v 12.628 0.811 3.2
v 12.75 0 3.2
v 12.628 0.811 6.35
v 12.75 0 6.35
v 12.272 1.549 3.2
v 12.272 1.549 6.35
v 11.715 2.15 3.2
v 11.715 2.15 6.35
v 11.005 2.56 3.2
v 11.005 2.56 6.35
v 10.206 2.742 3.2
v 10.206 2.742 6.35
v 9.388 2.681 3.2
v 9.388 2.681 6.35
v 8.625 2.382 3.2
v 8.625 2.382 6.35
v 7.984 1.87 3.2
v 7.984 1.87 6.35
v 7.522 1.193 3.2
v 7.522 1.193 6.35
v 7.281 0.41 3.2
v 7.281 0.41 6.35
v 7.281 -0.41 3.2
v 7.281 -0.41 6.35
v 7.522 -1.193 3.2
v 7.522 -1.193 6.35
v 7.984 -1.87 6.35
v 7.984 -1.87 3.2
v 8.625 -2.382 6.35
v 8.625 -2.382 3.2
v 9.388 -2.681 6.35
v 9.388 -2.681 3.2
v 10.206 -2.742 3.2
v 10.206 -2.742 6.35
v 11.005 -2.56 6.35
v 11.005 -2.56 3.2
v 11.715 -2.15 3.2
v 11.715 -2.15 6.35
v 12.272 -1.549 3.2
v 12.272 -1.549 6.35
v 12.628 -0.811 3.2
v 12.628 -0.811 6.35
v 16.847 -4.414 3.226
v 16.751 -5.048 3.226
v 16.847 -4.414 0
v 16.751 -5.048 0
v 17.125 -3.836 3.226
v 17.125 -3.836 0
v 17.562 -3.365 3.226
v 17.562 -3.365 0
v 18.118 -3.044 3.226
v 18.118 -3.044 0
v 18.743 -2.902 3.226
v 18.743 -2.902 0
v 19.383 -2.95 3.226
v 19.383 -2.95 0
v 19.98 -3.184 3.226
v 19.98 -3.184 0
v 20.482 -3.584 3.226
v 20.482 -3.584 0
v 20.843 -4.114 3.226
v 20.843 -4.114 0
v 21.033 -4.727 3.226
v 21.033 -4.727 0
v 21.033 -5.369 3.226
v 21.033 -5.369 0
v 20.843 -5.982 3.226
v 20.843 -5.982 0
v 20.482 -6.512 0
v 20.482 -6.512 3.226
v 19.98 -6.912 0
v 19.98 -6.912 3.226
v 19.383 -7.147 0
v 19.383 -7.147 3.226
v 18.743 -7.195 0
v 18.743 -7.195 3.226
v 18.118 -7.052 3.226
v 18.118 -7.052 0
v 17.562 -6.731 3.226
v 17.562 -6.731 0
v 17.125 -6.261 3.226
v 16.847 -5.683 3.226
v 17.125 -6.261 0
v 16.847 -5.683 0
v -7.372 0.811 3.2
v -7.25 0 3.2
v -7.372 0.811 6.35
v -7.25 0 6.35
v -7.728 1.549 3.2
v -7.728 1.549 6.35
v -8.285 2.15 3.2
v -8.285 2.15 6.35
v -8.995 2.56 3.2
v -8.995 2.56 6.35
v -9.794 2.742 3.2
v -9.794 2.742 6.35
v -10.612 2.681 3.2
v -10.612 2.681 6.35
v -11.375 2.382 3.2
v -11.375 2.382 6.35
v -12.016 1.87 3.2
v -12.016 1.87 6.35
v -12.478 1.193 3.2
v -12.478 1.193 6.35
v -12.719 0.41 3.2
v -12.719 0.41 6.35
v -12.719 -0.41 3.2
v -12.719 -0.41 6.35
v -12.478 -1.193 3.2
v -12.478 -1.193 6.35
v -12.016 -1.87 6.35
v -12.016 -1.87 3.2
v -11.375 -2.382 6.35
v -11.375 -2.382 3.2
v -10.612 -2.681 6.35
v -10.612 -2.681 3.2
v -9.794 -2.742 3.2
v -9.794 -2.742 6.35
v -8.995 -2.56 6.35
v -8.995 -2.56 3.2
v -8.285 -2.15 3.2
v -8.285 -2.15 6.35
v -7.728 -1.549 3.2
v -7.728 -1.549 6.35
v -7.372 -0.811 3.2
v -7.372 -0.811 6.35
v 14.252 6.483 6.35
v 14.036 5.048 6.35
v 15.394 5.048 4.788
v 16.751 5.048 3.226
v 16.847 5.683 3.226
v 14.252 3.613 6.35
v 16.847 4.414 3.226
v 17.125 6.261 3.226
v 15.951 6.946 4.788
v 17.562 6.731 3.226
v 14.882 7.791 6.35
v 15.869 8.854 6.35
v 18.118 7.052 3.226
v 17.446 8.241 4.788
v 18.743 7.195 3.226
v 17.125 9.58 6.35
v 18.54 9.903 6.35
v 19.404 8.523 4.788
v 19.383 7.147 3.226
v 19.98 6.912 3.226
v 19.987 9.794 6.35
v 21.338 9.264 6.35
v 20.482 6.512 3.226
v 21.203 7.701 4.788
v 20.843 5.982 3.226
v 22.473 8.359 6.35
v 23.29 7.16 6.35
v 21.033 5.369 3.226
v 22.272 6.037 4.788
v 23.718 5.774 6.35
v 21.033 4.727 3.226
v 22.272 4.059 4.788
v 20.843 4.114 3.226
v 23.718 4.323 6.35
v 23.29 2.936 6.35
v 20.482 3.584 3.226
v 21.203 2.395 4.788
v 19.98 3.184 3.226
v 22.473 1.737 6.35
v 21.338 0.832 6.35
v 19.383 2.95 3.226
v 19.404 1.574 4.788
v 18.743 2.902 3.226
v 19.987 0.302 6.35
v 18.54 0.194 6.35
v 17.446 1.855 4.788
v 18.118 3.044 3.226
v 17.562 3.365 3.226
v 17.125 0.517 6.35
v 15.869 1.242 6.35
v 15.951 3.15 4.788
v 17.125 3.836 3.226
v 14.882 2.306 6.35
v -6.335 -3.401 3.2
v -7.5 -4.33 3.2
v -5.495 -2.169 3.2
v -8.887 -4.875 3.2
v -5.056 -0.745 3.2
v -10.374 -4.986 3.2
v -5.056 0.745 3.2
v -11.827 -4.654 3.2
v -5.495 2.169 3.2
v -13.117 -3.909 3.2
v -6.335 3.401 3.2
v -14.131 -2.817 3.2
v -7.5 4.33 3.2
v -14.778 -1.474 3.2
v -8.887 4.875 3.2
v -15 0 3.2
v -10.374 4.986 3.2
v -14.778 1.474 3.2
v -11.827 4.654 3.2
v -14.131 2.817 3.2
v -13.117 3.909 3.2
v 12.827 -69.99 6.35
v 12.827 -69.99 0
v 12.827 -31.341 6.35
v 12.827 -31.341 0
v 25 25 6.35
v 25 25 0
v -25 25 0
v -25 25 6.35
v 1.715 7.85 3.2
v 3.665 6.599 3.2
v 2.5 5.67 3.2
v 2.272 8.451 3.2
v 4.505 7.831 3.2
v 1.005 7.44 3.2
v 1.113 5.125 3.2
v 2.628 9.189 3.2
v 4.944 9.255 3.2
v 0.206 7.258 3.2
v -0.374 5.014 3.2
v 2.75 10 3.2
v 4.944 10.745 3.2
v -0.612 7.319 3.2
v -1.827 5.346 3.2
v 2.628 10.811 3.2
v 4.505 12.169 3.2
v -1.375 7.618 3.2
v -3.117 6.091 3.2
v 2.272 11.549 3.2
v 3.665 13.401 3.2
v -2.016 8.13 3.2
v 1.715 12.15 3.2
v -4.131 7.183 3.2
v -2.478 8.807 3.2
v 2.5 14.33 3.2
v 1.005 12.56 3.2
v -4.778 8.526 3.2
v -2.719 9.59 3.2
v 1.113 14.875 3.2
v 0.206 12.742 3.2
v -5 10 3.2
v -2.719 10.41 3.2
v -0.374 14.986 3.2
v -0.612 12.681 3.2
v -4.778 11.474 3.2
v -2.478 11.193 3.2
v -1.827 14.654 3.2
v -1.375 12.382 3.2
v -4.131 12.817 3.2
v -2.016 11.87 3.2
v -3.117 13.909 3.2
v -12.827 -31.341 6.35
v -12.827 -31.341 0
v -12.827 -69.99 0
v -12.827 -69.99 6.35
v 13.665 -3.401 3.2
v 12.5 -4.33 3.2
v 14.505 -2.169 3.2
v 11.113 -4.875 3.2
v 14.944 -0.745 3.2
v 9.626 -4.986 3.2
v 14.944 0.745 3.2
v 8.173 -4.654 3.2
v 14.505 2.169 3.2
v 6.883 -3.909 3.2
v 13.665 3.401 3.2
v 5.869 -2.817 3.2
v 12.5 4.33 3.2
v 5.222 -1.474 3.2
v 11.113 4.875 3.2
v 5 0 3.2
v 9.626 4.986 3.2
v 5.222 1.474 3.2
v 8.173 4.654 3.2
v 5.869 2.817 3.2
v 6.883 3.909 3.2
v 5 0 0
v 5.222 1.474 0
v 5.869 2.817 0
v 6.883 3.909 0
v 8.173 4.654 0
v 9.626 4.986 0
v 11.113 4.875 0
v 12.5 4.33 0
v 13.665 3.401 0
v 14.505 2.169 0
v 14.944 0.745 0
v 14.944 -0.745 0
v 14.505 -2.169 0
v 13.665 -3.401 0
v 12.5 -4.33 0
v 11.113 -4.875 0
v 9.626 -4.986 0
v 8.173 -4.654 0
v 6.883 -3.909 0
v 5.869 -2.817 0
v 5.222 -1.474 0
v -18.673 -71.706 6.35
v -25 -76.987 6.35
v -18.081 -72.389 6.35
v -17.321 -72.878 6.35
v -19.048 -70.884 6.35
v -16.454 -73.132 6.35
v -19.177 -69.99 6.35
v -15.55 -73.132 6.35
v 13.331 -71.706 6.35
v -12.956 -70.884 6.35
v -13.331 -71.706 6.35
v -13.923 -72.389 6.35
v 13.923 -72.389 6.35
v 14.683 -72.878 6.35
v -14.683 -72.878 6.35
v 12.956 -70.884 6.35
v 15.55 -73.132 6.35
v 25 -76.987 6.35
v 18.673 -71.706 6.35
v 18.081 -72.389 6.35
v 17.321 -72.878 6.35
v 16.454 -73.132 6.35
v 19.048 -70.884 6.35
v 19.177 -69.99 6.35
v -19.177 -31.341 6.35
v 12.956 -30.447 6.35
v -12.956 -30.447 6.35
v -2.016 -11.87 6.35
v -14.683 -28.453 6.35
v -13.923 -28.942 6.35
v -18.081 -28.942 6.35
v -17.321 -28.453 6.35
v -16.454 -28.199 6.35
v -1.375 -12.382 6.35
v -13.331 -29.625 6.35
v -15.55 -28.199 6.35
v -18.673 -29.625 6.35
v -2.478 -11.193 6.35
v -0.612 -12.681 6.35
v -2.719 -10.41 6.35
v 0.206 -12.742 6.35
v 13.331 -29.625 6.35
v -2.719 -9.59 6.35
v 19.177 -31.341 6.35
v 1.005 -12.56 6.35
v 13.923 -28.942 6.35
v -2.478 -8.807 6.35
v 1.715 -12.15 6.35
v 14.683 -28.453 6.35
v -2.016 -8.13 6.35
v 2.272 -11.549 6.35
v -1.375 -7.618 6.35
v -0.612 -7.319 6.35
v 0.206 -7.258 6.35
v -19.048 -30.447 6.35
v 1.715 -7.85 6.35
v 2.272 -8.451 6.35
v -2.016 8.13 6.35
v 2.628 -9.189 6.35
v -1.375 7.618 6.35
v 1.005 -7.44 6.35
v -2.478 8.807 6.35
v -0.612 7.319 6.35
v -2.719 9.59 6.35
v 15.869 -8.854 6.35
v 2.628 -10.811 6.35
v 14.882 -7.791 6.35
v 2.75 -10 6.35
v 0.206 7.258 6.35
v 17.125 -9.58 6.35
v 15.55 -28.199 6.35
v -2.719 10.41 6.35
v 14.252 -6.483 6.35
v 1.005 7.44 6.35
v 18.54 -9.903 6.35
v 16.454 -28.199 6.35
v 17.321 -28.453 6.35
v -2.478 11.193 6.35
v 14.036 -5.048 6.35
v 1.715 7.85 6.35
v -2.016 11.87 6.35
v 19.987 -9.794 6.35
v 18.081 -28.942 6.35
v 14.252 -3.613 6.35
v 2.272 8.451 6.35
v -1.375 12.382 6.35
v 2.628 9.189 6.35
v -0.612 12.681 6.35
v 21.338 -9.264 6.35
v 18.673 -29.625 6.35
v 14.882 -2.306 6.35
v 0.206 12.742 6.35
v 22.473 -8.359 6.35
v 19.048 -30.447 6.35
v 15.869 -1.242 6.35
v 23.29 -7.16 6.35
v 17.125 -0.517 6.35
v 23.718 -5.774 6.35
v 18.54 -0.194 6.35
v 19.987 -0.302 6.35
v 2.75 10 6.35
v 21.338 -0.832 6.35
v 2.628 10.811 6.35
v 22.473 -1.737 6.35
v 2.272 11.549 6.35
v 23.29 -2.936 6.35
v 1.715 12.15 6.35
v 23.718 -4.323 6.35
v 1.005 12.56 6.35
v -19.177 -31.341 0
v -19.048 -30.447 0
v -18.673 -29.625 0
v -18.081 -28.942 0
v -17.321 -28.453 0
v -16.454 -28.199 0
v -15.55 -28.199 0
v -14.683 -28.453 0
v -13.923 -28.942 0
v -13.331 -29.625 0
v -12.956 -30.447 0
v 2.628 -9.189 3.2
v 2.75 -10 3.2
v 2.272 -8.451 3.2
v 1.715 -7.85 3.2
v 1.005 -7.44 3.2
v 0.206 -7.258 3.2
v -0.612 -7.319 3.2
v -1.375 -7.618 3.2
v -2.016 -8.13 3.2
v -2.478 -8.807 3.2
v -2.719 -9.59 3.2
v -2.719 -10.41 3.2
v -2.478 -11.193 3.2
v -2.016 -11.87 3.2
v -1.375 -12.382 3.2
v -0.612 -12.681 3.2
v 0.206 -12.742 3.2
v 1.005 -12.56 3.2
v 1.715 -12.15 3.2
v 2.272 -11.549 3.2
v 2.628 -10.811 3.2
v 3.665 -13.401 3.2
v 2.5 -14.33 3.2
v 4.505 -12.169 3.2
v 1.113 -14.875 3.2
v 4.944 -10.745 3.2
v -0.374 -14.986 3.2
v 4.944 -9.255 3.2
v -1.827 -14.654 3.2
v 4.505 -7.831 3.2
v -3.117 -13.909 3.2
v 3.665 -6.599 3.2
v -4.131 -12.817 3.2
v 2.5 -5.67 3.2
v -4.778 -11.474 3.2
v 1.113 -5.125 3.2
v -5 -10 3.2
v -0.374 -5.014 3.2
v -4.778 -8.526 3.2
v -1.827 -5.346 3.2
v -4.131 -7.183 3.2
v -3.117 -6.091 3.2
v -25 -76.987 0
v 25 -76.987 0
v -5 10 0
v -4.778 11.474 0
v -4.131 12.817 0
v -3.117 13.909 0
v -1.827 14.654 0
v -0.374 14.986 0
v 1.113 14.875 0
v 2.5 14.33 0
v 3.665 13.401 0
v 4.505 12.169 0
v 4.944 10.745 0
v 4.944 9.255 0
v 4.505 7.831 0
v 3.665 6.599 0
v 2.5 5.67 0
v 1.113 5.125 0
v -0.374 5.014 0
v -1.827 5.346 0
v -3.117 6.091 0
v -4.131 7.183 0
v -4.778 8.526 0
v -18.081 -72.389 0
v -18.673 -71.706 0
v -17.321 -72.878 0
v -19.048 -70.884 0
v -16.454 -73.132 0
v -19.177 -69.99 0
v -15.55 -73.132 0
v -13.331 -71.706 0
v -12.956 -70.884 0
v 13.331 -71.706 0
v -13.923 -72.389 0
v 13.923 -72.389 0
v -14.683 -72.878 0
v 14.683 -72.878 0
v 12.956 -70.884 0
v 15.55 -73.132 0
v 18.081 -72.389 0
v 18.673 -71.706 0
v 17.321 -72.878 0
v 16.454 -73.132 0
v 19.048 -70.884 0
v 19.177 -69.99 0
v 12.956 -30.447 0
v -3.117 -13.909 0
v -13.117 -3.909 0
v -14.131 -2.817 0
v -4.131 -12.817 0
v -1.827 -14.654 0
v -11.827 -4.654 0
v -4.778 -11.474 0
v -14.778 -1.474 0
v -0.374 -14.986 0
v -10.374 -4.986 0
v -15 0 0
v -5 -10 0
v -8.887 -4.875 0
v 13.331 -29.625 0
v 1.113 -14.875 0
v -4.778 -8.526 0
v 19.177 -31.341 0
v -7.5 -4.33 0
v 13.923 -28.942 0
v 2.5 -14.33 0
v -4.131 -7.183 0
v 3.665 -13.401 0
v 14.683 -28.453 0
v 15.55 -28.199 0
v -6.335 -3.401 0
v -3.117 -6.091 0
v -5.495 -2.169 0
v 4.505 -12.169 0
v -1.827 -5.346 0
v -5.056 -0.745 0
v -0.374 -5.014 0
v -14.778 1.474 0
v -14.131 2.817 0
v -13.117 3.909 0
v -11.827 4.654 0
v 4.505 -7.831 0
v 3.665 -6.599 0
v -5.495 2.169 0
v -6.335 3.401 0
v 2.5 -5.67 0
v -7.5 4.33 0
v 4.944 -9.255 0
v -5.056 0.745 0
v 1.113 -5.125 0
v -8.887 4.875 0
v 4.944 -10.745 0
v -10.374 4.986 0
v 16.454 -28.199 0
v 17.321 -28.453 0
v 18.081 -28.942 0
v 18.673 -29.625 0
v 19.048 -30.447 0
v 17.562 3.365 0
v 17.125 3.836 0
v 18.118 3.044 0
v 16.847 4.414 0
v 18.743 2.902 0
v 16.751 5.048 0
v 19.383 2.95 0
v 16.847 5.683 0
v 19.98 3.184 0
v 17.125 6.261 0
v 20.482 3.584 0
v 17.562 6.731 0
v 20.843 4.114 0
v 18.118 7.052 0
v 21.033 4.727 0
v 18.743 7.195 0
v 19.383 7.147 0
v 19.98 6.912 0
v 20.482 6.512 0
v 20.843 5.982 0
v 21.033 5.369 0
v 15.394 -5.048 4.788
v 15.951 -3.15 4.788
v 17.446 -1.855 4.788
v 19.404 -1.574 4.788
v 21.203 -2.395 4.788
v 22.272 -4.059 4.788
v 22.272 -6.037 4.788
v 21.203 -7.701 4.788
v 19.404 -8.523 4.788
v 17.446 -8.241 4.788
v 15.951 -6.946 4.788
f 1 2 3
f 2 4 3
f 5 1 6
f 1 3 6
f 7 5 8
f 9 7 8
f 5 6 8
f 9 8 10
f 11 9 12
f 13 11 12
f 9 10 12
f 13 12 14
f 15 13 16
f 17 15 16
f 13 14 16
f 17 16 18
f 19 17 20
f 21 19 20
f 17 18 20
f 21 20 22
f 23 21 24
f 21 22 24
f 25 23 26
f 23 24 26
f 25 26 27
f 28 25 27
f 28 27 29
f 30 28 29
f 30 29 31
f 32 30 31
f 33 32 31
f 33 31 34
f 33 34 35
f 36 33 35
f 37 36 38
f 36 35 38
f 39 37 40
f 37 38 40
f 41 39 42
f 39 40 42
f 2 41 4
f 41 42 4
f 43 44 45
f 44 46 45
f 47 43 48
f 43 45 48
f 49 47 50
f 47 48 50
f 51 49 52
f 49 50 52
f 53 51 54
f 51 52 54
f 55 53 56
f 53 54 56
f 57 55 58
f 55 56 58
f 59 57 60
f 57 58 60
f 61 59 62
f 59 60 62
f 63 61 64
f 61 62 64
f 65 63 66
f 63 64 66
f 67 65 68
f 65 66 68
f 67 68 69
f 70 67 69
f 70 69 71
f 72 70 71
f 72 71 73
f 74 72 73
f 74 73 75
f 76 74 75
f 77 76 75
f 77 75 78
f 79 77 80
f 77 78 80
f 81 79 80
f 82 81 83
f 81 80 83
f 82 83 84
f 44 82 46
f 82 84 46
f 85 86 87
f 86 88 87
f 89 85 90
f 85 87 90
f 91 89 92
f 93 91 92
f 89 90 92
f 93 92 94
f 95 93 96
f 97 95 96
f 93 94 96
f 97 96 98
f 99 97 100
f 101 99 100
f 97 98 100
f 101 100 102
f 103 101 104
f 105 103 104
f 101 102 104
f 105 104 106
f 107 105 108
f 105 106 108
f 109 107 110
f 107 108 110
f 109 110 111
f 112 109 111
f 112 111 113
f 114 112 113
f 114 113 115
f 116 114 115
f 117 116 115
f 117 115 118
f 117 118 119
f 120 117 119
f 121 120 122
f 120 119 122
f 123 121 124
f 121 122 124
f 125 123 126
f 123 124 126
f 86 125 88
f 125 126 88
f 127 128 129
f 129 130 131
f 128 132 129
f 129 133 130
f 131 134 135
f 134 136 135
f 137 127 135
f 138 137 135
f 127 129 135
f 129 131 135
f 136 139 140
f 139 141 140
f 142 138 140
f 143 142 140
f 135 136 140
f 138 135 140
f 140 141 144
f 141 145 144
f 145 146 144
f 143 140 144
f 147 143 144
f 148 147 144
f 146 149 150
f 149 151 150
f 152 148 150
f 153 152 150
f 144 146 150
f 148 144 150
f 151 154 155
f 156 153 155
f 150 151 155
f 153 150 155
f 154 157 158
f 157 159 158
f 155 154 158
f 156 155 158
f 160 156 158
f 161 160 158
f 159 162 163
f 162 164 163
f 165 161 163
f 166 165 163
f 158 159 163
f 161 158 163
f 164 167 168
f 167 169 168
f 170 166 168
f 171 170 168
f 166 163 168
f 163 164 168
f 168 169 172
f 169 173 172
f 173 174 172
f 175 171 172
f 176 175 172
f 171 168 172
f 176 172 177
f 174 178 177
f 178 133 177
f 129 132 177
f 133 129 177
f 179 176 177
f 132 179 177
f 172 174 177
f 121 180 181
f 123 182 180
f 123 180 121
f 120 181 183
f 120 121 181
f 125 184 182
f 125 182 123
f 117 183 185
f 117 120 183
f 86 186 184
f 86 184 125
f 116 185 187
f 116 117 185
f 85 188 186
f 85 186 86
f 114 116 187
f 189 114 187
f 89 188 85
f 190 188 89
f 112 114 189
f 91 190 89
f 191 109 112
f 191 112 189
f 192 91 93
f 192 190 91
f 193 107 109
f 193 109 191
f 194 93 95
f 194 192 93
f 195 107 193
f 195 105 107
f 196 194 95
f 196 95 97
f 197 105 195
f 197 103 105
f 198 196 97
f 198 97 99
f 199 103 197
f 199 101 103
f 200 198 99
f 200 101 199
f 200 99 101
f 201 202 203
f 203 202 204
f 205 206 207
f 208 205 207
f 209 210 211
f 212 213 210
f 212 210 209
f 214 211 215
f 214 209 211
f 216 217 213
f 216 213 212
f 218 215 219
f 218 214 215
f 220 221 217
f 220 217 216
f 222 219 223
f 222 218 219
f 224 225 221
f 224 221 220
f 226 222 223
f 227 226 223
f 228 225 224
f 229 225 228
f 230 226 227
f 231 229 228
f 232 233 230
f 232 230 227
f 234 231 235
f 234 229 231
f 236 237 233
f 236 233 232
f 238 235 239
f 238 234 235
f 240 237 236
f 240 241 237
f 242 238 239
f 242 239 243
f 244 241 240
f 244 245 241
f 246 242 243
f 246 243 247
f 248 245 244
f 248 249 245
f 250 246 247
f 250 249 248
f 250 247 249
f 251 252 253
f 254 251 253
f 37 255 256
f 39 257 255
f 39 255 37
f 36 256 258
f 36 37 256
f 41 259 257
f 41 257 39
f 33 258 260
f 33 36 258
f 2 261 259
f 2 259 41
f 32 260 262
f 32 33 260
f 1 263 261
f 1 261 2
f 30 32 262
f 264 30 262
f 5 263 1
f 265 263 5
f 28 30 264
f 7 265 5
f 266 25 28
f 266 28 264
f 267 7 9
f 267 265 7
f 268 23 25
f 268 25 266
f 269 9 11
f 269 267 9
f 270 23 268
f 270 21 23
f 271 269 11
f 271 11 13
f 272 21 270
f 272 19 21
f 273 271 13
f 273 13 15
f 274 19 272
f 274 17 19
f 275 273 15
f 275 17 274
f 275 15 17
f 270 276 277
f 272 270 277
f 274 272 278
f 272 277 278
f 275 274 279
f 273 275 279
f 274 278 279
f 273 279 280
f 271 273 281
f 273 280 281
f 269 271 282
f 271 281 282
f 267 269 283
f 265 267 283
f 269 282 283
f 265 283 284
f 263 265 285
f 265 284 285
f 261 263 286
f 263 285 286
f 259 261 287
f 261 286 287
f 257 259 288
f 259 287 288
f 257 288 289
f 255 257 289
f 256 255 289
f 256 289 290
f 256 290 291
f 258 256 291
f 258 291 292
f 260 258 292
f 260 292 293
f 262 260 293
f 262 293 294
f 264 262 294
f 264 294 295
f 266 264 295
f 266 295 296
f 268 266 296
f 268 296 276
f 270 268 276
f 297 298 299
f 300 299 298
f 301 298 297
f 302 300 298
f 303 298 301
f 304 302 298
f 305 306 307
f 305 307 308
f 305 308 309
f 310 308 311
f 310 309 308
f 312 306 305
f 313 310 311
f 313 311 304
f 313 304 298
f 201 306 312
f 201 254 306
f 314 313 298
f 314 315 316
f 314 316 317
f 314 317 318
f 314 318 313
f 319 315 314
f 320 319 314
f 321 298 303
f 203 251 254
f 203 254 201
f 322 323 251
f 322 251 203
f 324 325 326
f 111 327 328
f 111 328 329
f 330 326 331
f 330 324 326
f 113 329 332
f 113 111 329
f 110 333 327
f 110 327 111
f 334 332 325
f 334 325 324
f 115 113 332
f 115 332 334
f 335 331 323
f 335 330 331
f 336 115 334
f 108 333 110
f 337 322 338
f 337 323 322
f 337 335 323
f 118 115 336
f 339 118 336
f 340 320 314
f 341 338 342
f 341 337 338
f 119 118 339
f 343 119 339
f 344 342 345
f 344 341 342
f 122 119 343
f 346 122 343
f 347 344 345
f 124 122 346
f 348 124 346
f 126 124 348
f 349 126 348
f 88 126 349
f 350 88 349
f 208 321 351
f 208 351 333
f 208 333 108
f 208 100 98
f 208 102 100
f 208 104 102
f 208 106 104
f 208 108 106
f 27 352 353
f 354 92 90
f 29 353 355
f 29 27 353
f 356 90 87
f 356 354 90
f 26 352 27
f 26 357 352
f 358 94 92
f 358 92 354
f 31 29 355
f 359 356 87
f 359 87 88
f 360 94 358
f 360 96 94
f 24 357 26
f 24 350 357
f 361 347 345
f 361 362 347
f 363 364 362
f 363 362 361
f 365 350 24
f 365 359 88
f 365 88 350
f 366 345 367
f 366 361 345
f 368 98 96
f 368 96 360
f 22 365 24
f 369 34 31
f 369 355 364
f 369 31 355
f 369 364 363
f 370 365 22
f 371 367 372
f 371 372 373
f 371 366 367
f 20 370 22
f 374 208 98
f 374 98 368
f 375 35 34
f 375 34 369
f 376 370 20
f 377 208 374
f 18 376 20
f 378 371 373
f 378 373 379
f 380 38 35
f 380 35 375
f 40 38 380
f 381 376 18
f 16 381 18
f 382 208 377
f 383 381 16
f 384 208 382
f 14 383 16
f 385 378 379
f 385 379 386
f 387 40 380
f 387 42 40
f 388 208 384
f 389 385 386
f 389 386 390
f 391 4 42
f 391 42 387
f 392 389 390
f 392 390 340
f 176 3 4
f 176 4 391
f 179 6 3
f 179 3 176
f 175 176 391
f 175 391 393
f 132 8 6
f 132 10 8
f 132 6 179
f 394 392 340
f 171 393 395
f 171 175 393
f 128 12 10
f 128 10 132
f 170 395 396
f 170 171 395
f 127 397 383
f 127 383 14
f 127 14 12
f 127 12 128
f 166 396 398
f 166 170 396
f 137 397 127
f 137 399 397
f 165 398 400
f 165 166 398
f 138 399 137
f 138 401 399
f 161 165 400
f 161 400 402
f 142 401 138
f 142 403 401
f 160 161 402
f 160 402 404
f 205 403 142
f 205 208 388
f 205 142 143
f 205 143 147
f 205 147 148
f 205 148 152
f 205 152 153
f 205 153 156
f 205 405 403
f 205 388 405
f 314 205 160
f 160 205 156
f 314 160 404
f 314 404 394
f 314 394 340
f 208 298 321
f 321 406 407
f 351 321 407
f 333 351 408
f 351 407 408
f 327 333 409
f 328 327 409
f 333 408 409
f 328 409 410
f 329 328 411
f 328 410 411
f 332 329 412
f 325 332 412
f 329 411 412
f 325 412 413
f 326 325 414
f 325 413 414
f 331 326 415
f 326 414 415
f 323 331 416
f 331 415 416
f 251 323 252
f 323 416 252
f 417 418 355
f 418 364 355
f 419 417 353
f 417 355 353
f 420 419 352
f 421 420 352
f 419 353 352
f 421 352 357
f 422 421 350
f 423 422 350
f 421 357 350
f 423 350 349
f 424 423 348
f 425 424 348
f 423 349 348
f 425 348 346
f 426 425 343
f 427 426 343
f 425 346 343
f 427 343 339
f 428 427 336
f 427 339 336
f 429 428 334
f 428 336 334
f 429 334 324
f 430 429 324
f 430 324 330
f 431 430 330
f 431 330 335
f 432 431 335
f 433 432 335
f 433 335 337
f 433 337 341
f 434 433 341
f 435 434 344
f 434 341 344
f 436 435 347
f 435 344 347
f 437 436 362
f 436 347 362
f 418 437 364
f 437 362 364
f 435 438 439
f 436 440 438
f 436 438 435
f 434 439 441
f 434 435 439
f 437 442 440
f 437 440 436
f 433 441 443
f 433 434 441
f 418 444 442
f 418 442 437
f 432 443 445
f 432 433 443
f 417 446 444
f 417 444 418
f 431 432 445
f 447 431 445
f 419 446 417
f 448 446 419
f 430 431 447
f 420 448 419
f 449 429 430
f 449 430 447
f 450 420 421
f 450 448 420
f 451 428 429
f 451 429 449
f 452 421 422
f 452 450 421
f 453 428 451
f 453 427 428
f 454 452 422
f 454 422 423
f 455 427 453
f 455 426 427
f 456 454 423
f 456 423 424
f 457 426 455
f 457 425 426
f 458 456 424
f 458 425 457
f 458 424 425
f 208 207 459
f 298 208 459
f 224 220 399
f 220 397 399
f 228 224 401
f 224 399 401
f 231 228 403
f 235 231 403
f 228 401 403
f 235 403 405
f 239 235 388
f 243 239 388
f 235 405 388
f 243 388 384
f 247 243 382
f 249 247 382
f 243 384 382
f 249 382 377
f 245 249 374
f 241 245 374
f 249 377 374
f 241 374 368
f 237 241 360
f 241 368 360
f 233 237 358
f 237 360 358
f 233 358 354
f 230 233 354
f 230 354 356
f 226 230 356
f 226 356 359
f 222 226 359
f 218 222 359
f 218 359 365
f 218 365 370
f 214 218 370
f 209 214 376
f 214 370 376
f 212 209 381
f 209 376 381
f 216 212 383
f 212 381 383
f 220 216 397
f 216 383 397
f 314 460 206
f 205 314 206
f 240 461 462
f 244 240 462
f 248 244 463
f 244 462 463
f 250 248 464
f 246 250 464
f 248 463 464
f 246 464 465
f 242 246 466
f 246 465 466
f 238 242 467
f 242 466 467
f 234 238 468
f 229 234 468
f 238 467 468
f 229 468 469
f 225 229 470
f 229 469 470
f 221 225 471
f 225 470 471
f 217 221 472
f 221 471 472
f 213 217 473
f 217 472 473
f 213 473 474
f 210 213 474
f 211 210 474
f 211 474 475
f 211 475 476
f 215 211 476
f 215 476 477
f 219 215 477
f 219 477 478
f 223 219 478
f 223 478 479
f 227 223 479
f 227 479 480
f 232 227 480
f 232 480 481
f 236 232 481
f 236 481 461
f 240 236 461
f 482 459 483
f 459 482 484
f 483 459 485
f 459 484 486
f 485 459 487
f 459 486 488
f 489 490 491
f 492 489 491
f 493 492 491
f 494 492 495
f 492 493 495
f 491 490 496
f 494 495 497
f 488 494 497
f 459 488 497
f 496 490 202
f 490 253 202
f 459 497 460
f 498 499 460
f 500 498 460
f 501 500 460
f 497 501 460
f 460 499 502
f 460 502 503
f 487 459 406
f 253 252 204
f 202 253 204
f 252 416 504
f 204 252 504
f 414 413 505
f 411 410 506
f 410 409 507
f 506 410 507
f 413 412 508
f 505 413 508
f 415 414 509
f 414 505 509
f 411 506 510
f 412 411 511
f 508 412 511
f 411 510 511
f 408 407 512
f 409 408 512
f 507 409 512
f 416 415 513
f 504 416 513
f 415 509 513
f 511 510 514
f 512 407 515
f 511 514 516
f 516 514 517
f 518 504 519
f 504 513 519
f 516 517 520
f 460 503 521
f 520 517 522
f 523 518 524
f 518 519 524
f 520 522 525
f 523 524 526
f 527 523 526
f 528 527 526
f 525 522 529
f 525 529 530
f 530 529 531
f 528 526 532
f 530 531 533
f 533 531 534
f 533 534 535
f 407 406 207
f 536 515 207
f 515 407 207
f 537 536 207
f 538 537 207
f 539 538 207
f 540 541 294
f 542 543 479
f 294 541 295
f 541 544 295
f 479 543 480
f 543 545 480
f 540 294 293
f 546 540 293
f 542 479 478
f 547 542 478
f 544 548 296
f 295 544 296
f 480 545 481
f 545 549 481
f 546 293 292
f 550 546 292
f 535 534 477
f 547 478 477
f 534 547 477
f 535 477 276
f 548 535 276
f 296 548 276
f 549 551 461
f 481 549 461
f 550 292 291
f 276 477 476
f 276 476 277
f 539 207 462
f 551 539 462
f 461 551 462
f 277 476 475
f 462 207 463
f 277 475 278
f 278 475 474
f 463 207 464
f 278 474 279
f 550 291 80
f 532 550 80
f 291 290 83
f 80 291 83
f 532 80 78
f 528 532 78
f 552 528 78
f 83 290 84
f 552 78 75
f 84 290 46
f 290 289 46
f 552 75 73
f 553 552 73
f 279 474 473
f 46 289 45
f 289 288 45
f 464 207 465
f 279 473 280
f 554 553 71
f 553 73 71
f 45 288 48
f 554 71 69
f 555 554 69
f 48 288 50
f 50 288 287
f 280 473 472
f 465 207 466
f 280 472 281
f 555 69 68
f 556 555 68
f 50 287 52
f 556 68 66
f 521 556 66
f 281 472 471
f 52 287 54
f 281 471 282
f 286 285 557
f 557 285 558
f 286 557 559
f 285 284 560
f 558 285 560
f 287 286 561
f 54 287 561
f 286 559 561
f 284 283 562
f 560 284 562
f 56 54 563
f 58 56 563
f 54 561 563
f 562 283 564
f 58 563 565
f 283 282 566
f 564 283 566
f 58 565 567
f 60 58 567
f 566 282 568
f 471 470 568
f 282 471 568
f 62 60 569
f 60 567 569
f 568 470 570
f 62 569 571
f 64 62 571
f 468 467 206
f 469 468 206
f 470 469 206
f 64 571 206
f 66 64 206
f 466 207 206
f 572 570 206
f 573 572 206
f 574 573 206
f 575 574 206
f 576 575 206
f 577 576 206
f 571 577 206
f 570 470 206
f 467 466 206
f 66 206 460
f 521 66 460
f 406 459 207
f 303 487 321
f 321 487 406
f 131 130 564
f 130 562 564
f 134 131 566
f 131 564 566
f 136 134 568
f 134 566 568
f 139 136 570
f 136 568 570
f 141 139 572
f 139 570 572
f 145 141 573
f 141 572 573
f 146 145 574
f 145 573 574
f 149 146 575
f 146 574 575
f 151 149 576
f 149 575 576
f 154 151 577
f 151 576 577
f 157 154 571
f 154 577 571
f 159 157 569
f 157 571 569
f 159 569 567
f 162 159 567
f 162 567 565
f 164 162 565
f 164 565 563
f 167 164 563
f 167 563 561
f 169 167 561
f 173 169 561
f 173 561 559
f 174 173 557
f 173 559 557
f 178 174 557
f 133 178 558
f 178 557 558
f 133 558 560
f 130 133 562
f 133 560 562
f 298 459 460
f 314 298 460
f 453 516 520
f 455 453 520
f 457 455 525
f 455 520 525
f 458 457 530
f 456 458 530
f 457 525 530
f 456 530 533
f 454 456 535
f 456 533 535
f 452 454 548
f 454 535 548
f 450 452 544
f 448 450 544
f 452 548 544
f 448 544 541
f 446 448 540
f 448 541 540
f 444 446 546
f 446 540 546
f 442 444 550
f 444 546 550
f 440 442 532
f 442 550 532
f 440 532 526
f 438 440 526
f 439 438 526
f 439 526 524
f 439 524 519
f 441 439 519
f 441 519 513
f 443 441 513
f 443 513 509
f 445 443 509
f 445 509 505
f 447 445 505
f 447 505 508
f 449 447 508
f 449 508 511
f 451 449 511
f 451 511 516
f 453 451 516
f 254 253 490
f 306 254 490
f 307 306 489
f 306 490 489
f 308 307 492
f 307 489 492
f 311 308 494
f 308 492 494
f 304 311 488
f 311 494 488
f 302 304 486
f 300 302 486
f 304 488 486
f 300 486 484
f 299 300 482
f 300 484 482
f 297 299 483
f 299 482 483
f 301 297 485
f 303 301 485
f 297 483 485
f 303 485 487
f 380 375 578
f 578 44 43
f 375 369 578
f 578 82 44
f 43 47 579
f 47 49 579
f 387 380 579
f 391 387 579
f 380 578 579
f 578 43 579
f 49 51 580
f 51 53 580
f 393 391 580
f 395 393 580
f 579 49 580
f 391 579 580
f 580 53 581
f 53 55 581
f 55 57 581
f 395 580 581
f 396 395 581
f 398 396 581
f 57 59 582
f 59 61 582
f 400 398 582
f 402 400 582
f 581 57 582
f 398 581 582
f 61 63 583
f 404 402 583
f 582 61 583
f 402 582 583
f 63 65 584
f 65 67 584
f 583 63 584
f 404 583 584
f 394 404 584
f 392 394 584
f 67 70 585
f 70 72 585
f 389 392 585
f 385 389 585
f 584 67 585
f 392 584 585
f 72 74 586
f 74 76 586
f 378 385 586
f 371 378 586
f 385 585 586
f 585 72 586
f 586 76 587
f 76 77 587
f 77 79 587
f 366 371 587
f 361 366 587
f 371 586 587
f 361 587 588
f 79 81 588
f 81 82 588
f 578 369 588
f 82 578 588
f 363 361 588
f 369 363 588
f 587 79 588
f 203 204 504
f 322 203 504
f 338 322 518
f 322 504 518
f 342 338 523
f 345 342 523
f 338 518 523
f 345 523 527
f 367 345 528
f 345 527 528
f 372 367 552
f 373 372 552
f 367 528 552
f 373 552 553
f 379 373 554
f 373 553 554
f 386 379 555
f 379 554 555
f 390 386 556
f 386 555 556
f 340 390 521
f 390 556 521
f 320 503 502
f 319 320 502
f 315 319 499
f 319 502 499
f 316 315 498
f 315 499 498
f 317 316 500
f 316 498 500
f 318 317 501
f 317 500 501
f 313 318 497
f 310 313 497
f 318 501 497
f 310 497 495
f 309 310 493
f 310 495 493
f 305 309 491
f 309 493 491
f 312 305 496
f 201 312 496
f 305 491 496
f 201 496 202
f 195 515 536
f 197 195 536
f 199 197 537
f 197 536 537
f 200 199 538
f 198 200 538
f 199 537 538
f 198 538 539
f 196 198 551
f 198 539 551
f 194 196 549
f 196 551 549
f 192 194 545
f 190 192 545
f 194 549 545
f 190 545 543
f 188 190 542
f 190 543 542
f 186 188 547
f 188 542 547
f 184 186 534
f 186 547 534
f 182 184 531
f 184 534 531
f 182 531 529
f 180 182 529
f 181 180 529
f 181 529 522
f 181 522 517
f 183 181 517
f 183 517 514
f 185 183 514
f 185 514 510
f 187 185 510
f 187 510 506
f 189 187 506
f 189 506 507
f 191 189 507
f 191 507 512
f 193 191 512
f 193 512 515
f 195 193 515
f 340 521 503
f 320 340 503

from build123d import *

# Parameters (mm, degrees)
BOSS_EXTRUDE1_DEPTH                            = 6.35
CSK_FOR_6_FLAT_HEAD_MACHINE_SCREW2_D           = 4.3053
CSK_FOR_6_FLAT_HEAD_MACHINE_SCREW2_CSINK_D     = 9.7361756
CSK_FOR_6_FLAT_HEAD_MACHINE_SCREW2_CSINK_ANGLE = 82
CBORE_FOR_M5_SHCS1_D                           = 5.5
CBORE_FOR_M5_SHCS1_CBORE_D                     = 10
CBORE_FOR_M5_SHCS1_CBORE_DEPTH                 = 3.2


with BuildPart() as part:
    # Sketch1 → Boss-Extrude1 (new body)
    with BuildSketch(Plane.XY):
        Polygon((25, -76.9874), (25, 25), (-25, 25), (-25, -76.9874), (0, -76.9874), align=None)
        with BuildLine():
            ThreePointArc((-19.177, -31.341450548), (-16.002, -28.166450548), (-12.827, -31.341450548))
            Line((-12.827, -31.341450548), (-12.827, -69.9897))
            ThreePointArc((-12.827, -69.9897), (-16.002, -73.1647), (-19.177, -69.9897))
            Line((-19.177, -69.9897), (-19.177, -31.341450548))
        make_face(mode=Mode.SUBTRACT)
        with BuildLine():
            ThreePointArc((12.827, -31.341450548), (16.002, -28.166450548), (19.177, -31.341450548))
            Line((19.177, -31.341450548), (19.177, -69.9897))
            ThreePointArc((19.177, -69.9897), (16.002, -73.1647), (12.827, -69.9897))
            Line((12.827, -69.9897), (12.827, -31.341450548))
        make_face(mode=Mode.SUBTRACT)
    extrude(amount=BOSS_EXTRUDE1_DEPTH)

    # CSK for #6 Flat Head Machine Screw2 (through all)
    with Locations(Plane.XY.offset(6.35)):
        with Locations((18.904, 5.04825), (18.904, -5.04825)):
            CounterSinkHole(CSK_FOR_6_FLAT_HEAD_MACHINE_SCREW2_D / 2, CSK_FOR_6_FLAT_HEAD_MACHINE_SCREW2_CSINK_D / 2, counter_sink_angle=CSK_FOR_6_FLAT_HEAD_MACHINE_SCREW2_CSINK_ANGLE)

    # CBORE for M5 SHCS1 (through all)
    with Locations(Plane(origin=(0, 0, 0), x_dir=(-1, 0, 0), z_dir=(0, 0, -1))):
        with Locations((0, 10), (-10, 0), (0, -10), (10, 0)):
            CounterBoreHole(CBORE_FOR_M5_SHCS1_D / 2, CBORE_FOR_M5_SHCS1_CBORE_D / 2, CBORE_FOR_M5_SHCS1_CBORE_DEPTH)


solid = part.part
